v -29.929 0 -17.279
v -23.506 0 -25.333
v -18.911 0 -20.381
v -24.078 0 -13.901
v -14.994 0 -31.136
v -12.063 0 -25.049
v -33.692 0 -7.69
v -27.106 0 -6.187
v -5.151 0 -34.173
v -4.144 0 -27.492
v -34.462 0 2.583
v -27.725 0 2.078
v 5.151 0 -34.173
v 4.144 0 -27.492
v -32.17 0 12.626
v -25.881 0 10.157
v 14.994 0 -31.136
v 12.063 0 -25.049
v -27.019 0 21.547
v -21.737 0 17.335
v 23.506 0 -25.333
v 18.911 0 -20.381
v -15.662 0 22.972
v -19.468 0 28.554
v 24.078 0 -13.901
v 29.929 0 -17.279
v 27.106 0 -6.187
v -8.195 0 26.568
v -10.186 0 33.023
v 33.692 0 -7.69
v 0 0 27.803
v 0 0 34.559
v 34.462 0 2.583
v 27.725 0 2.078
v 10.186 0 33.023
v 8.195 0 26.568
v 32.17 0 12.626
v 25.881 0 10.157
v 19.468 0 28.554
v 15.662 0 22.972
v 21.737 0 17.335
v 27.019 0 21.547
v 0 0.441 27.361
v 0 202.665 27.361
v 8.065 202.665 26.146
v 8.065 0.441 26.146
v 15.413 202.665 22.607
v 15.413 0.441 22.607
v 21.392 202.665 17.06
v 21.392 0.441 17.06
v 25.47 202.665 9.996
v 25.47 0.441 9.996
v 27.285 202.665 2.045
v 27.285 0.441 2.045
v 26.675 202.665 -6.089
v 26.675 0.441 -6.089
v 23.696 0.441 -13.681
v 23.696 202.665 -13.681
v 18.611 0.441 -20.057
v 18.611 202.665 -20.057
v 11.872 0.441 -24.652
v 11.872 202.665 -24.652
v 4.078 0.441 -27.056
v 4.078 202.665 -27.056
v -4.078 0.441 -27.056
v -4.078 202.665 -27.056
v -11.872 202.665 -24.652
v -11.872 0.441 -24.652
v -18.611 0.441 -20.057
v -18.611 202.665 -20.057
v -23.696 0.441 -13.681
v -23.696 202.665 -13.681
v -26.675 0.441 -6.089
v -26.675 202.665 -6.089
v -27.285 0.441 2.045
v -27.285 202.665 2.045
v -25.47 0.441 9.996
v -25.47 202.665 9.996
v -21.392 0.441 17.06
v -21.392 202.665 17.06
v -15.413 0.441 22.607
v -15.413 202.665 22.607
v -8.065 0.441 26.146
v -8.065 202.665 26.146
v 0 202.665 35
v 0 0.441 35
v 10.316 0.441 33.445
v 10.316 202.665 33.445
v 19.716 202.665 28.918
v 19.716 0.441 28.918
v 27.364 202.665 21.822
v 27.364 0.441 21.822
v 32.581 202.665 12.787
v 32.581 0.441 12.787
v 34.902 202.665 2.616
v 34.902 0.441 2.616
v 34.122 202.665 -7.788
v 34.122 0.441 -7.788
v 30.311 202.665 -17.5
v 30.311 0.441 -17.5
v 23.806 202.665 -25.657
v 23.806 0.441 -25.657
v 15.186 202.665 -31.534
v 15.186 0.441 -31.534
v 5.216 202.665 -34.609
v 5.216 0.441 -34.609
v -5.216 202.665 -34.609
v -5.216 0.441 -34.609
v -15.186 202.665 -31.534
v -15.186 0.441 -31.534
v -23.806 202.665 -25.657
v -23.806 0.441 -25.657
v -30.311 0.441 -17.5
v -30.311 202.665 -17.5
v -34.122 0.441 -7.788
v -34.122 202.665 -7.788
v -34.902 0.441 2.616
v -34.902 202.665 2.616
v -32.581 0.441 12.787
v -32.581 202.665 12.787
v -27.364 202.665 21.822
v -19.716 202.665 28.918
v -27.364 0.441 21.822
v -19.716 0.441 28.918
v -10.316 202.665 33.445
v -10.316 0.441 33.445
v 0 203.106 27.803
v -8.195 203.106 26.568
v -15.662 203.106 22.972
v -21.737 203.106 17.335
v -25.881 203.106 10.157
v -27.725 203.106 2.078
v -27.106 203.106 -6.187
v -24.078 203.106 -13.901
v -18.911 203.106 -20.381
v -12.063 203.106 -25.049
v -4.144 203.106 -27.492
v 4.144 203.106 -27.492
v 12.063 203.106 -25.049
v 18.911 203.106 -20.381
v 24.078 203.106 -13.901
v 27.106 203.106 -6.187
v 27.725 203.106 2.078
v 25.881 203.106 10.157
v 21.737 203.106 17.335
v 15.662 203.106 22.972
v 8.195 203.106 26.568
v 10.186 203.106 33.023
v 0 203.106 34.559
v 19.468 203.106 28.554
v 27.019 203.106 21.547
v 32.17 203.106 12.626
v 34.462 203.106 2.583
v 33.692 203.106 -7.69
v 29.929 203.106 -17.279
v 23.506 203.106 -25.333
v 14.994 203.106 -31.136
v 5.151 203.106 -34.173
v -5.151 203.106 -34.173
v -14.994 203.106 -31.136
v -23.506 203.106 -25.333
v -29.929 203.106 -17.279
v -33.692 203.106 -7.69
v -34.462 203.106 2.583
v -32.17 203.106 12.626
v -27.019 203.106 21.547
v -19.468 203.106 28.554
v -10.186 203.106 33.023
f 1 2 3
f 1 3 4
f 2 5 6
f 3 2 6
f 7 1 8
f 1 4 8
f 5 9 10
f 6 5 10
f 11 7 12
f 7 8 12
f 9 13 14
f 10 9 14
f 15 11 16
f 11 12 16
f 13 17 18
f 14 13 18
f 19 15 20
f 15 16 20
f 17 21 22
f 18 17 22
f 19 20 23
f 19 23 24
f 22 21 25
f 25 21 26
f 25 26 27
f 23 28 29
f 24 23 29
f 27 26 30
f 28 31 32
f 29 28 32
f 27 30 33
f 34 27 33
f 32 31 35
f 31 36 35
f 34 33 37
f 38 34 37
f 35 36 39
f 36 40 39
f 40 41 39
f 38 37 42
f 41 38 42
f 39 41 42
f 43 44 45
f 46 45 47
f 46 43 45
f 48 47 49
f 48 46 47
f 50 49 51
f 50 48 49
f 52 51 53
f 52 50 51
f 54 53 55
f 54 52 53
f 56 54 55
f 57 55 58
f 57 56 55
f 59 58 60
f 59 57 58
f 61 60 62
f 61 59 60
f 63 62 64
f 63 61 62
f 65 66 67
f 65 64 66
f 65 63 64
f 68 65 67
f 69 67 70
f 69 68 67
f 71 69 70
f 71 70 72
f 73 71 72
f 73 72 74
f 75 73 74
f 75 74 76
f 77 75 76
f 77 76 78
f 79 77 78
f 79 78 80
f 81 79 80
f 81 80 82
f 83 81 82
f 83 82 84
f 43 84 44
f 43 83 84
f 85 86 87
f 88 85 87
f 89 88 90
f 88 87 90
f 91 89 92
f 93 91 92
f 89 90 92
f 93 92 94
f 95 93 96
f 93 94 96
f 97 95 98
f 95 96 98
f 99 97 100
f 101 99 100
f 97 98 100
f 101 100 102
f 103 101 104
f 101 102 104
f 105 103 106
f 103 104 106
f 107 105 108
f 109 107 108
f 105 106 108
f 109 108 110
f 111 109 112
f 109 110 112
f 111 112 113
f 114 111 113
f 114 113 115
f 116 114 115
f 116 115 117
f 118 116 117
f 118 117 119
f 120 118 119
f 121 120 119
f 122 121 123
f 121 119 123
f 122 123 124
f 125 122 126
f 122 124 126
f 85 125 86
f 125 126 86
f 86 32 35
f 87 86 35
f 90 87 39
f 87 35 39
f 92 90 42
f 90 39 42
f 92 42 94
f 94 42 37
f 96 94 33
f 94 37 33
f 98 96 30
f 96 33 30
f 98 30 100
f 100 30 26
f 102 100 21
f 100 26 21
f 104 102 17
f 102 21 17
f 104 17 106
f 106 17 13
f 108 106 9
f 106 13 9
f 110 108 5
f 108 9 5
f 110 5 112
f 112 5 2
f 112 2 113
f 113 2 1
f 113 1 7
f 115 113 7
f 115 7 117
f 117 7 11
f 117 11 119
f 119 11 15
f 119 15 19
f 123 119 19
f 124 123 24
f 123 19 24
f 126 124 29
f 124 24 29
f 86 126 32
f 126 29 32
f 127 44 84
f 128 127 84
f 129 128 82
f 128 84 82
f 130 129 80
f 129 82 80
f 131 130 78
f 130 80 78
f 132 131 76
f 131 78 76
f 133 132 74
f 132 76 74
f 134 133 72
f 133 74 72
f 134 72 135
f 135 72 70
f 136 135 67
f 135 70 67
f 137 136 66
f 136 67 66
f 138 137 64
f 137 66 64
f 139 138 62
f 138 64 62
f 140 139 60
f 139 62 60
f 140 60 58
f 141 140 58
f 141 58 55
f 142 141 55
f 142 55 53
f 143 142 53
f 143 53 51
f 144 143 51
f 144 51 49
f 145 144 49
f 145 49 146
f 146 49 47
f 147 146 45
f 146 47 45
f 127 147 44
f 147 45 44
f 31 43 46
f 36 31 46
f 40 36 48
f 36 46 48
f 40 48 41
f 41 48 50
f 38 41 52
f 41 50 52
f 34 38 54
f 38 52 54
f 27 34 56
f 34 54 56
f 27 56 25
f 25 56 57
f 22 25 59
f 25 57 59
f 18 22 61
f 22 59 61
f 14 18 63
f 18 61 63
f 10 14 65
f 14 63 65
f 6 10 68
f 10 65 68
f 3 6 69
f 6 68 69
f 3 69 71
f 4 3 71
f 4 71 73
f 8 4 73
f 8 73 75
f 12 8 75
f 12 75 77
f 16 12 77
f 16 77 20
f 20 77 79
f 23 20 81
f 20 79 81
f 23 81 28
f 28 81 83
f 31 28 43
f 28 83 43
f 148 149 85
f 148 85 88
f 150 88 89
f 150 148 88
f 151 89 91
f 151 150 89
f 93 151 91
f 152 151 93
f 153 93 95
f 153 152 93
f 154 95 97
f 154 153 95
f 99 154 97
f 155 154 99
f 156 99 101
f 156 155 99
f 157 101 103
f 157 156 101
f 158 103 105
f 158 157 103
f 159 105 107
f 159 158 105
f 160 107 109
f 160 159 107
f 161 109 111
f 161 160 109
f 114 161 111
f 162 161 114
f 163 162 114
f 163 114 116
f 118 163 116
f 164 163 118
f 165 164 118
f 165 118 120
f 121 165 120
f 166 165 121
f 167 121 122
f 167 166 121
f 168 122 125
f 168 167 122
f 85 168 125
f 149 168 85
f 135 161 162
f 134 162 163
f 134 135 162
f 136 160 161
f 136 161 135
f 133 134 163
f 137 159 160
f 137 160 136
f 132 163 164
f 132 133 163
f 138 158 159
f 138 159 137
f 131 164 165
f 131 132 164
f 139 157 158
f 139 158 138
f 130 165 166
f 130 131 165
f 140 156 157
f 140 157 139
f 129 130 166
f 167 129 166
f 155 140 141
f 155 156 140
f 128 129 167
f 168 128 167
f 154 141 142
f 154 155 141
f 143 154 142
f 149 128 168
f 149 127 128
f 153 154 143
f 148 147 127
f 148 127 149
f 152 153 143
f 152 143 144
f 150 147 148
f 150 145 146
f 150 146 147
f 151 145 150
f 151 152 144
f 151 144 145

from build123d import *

# Parameters (mm, degrees)
SKETCH1_R           = 35
BOSS_EXTRUDE1_DEPTH = 203.105967649
SKETCH2_R           = 27.36149988
CUT_EXTRUDE1_DEPTH  = 210.050314744
CHAMFER1_SIZE       = 0.441228143


with BuildPart() as part:
    # Sketch1 → Boss-Extrude1 (new body)
    with BuildSketch(Plane(origin=(0, 0, 0), x_dir=(1, 0, 0), z_dir=(0, 1, 0))):
        Circle(SKETCH1_R)
    extrude(amount=BOSS_EXTRUDE1_DEPTH)

    # Sketch2 → Cut-Extrude1 (cut, through all)
    with BuildSketch(Plane(origin=(0, 0, 0), x_dir=(1, 0, 0), z_dir=(0, 1, 0))):
        Circle(SKETCH2_R)
    extrude(amount=CUT_EXTRUDE1_DEPTH, mode=Mode.SUBTRACT)

    # Chamfer1
    chamfer1_edges = [part.edges().sort_by_distance(p)[0] for p in [
        (-27.36149988, 203.105967649, 0),
        (-27.36149988, 0, 0),
        (-35, 0, 0),
        (-35, 203.105967649, 0),
    ]]
    chamfer(chamfer1_edges, length=CHAMFER1_SIZE)


solid = part.part
